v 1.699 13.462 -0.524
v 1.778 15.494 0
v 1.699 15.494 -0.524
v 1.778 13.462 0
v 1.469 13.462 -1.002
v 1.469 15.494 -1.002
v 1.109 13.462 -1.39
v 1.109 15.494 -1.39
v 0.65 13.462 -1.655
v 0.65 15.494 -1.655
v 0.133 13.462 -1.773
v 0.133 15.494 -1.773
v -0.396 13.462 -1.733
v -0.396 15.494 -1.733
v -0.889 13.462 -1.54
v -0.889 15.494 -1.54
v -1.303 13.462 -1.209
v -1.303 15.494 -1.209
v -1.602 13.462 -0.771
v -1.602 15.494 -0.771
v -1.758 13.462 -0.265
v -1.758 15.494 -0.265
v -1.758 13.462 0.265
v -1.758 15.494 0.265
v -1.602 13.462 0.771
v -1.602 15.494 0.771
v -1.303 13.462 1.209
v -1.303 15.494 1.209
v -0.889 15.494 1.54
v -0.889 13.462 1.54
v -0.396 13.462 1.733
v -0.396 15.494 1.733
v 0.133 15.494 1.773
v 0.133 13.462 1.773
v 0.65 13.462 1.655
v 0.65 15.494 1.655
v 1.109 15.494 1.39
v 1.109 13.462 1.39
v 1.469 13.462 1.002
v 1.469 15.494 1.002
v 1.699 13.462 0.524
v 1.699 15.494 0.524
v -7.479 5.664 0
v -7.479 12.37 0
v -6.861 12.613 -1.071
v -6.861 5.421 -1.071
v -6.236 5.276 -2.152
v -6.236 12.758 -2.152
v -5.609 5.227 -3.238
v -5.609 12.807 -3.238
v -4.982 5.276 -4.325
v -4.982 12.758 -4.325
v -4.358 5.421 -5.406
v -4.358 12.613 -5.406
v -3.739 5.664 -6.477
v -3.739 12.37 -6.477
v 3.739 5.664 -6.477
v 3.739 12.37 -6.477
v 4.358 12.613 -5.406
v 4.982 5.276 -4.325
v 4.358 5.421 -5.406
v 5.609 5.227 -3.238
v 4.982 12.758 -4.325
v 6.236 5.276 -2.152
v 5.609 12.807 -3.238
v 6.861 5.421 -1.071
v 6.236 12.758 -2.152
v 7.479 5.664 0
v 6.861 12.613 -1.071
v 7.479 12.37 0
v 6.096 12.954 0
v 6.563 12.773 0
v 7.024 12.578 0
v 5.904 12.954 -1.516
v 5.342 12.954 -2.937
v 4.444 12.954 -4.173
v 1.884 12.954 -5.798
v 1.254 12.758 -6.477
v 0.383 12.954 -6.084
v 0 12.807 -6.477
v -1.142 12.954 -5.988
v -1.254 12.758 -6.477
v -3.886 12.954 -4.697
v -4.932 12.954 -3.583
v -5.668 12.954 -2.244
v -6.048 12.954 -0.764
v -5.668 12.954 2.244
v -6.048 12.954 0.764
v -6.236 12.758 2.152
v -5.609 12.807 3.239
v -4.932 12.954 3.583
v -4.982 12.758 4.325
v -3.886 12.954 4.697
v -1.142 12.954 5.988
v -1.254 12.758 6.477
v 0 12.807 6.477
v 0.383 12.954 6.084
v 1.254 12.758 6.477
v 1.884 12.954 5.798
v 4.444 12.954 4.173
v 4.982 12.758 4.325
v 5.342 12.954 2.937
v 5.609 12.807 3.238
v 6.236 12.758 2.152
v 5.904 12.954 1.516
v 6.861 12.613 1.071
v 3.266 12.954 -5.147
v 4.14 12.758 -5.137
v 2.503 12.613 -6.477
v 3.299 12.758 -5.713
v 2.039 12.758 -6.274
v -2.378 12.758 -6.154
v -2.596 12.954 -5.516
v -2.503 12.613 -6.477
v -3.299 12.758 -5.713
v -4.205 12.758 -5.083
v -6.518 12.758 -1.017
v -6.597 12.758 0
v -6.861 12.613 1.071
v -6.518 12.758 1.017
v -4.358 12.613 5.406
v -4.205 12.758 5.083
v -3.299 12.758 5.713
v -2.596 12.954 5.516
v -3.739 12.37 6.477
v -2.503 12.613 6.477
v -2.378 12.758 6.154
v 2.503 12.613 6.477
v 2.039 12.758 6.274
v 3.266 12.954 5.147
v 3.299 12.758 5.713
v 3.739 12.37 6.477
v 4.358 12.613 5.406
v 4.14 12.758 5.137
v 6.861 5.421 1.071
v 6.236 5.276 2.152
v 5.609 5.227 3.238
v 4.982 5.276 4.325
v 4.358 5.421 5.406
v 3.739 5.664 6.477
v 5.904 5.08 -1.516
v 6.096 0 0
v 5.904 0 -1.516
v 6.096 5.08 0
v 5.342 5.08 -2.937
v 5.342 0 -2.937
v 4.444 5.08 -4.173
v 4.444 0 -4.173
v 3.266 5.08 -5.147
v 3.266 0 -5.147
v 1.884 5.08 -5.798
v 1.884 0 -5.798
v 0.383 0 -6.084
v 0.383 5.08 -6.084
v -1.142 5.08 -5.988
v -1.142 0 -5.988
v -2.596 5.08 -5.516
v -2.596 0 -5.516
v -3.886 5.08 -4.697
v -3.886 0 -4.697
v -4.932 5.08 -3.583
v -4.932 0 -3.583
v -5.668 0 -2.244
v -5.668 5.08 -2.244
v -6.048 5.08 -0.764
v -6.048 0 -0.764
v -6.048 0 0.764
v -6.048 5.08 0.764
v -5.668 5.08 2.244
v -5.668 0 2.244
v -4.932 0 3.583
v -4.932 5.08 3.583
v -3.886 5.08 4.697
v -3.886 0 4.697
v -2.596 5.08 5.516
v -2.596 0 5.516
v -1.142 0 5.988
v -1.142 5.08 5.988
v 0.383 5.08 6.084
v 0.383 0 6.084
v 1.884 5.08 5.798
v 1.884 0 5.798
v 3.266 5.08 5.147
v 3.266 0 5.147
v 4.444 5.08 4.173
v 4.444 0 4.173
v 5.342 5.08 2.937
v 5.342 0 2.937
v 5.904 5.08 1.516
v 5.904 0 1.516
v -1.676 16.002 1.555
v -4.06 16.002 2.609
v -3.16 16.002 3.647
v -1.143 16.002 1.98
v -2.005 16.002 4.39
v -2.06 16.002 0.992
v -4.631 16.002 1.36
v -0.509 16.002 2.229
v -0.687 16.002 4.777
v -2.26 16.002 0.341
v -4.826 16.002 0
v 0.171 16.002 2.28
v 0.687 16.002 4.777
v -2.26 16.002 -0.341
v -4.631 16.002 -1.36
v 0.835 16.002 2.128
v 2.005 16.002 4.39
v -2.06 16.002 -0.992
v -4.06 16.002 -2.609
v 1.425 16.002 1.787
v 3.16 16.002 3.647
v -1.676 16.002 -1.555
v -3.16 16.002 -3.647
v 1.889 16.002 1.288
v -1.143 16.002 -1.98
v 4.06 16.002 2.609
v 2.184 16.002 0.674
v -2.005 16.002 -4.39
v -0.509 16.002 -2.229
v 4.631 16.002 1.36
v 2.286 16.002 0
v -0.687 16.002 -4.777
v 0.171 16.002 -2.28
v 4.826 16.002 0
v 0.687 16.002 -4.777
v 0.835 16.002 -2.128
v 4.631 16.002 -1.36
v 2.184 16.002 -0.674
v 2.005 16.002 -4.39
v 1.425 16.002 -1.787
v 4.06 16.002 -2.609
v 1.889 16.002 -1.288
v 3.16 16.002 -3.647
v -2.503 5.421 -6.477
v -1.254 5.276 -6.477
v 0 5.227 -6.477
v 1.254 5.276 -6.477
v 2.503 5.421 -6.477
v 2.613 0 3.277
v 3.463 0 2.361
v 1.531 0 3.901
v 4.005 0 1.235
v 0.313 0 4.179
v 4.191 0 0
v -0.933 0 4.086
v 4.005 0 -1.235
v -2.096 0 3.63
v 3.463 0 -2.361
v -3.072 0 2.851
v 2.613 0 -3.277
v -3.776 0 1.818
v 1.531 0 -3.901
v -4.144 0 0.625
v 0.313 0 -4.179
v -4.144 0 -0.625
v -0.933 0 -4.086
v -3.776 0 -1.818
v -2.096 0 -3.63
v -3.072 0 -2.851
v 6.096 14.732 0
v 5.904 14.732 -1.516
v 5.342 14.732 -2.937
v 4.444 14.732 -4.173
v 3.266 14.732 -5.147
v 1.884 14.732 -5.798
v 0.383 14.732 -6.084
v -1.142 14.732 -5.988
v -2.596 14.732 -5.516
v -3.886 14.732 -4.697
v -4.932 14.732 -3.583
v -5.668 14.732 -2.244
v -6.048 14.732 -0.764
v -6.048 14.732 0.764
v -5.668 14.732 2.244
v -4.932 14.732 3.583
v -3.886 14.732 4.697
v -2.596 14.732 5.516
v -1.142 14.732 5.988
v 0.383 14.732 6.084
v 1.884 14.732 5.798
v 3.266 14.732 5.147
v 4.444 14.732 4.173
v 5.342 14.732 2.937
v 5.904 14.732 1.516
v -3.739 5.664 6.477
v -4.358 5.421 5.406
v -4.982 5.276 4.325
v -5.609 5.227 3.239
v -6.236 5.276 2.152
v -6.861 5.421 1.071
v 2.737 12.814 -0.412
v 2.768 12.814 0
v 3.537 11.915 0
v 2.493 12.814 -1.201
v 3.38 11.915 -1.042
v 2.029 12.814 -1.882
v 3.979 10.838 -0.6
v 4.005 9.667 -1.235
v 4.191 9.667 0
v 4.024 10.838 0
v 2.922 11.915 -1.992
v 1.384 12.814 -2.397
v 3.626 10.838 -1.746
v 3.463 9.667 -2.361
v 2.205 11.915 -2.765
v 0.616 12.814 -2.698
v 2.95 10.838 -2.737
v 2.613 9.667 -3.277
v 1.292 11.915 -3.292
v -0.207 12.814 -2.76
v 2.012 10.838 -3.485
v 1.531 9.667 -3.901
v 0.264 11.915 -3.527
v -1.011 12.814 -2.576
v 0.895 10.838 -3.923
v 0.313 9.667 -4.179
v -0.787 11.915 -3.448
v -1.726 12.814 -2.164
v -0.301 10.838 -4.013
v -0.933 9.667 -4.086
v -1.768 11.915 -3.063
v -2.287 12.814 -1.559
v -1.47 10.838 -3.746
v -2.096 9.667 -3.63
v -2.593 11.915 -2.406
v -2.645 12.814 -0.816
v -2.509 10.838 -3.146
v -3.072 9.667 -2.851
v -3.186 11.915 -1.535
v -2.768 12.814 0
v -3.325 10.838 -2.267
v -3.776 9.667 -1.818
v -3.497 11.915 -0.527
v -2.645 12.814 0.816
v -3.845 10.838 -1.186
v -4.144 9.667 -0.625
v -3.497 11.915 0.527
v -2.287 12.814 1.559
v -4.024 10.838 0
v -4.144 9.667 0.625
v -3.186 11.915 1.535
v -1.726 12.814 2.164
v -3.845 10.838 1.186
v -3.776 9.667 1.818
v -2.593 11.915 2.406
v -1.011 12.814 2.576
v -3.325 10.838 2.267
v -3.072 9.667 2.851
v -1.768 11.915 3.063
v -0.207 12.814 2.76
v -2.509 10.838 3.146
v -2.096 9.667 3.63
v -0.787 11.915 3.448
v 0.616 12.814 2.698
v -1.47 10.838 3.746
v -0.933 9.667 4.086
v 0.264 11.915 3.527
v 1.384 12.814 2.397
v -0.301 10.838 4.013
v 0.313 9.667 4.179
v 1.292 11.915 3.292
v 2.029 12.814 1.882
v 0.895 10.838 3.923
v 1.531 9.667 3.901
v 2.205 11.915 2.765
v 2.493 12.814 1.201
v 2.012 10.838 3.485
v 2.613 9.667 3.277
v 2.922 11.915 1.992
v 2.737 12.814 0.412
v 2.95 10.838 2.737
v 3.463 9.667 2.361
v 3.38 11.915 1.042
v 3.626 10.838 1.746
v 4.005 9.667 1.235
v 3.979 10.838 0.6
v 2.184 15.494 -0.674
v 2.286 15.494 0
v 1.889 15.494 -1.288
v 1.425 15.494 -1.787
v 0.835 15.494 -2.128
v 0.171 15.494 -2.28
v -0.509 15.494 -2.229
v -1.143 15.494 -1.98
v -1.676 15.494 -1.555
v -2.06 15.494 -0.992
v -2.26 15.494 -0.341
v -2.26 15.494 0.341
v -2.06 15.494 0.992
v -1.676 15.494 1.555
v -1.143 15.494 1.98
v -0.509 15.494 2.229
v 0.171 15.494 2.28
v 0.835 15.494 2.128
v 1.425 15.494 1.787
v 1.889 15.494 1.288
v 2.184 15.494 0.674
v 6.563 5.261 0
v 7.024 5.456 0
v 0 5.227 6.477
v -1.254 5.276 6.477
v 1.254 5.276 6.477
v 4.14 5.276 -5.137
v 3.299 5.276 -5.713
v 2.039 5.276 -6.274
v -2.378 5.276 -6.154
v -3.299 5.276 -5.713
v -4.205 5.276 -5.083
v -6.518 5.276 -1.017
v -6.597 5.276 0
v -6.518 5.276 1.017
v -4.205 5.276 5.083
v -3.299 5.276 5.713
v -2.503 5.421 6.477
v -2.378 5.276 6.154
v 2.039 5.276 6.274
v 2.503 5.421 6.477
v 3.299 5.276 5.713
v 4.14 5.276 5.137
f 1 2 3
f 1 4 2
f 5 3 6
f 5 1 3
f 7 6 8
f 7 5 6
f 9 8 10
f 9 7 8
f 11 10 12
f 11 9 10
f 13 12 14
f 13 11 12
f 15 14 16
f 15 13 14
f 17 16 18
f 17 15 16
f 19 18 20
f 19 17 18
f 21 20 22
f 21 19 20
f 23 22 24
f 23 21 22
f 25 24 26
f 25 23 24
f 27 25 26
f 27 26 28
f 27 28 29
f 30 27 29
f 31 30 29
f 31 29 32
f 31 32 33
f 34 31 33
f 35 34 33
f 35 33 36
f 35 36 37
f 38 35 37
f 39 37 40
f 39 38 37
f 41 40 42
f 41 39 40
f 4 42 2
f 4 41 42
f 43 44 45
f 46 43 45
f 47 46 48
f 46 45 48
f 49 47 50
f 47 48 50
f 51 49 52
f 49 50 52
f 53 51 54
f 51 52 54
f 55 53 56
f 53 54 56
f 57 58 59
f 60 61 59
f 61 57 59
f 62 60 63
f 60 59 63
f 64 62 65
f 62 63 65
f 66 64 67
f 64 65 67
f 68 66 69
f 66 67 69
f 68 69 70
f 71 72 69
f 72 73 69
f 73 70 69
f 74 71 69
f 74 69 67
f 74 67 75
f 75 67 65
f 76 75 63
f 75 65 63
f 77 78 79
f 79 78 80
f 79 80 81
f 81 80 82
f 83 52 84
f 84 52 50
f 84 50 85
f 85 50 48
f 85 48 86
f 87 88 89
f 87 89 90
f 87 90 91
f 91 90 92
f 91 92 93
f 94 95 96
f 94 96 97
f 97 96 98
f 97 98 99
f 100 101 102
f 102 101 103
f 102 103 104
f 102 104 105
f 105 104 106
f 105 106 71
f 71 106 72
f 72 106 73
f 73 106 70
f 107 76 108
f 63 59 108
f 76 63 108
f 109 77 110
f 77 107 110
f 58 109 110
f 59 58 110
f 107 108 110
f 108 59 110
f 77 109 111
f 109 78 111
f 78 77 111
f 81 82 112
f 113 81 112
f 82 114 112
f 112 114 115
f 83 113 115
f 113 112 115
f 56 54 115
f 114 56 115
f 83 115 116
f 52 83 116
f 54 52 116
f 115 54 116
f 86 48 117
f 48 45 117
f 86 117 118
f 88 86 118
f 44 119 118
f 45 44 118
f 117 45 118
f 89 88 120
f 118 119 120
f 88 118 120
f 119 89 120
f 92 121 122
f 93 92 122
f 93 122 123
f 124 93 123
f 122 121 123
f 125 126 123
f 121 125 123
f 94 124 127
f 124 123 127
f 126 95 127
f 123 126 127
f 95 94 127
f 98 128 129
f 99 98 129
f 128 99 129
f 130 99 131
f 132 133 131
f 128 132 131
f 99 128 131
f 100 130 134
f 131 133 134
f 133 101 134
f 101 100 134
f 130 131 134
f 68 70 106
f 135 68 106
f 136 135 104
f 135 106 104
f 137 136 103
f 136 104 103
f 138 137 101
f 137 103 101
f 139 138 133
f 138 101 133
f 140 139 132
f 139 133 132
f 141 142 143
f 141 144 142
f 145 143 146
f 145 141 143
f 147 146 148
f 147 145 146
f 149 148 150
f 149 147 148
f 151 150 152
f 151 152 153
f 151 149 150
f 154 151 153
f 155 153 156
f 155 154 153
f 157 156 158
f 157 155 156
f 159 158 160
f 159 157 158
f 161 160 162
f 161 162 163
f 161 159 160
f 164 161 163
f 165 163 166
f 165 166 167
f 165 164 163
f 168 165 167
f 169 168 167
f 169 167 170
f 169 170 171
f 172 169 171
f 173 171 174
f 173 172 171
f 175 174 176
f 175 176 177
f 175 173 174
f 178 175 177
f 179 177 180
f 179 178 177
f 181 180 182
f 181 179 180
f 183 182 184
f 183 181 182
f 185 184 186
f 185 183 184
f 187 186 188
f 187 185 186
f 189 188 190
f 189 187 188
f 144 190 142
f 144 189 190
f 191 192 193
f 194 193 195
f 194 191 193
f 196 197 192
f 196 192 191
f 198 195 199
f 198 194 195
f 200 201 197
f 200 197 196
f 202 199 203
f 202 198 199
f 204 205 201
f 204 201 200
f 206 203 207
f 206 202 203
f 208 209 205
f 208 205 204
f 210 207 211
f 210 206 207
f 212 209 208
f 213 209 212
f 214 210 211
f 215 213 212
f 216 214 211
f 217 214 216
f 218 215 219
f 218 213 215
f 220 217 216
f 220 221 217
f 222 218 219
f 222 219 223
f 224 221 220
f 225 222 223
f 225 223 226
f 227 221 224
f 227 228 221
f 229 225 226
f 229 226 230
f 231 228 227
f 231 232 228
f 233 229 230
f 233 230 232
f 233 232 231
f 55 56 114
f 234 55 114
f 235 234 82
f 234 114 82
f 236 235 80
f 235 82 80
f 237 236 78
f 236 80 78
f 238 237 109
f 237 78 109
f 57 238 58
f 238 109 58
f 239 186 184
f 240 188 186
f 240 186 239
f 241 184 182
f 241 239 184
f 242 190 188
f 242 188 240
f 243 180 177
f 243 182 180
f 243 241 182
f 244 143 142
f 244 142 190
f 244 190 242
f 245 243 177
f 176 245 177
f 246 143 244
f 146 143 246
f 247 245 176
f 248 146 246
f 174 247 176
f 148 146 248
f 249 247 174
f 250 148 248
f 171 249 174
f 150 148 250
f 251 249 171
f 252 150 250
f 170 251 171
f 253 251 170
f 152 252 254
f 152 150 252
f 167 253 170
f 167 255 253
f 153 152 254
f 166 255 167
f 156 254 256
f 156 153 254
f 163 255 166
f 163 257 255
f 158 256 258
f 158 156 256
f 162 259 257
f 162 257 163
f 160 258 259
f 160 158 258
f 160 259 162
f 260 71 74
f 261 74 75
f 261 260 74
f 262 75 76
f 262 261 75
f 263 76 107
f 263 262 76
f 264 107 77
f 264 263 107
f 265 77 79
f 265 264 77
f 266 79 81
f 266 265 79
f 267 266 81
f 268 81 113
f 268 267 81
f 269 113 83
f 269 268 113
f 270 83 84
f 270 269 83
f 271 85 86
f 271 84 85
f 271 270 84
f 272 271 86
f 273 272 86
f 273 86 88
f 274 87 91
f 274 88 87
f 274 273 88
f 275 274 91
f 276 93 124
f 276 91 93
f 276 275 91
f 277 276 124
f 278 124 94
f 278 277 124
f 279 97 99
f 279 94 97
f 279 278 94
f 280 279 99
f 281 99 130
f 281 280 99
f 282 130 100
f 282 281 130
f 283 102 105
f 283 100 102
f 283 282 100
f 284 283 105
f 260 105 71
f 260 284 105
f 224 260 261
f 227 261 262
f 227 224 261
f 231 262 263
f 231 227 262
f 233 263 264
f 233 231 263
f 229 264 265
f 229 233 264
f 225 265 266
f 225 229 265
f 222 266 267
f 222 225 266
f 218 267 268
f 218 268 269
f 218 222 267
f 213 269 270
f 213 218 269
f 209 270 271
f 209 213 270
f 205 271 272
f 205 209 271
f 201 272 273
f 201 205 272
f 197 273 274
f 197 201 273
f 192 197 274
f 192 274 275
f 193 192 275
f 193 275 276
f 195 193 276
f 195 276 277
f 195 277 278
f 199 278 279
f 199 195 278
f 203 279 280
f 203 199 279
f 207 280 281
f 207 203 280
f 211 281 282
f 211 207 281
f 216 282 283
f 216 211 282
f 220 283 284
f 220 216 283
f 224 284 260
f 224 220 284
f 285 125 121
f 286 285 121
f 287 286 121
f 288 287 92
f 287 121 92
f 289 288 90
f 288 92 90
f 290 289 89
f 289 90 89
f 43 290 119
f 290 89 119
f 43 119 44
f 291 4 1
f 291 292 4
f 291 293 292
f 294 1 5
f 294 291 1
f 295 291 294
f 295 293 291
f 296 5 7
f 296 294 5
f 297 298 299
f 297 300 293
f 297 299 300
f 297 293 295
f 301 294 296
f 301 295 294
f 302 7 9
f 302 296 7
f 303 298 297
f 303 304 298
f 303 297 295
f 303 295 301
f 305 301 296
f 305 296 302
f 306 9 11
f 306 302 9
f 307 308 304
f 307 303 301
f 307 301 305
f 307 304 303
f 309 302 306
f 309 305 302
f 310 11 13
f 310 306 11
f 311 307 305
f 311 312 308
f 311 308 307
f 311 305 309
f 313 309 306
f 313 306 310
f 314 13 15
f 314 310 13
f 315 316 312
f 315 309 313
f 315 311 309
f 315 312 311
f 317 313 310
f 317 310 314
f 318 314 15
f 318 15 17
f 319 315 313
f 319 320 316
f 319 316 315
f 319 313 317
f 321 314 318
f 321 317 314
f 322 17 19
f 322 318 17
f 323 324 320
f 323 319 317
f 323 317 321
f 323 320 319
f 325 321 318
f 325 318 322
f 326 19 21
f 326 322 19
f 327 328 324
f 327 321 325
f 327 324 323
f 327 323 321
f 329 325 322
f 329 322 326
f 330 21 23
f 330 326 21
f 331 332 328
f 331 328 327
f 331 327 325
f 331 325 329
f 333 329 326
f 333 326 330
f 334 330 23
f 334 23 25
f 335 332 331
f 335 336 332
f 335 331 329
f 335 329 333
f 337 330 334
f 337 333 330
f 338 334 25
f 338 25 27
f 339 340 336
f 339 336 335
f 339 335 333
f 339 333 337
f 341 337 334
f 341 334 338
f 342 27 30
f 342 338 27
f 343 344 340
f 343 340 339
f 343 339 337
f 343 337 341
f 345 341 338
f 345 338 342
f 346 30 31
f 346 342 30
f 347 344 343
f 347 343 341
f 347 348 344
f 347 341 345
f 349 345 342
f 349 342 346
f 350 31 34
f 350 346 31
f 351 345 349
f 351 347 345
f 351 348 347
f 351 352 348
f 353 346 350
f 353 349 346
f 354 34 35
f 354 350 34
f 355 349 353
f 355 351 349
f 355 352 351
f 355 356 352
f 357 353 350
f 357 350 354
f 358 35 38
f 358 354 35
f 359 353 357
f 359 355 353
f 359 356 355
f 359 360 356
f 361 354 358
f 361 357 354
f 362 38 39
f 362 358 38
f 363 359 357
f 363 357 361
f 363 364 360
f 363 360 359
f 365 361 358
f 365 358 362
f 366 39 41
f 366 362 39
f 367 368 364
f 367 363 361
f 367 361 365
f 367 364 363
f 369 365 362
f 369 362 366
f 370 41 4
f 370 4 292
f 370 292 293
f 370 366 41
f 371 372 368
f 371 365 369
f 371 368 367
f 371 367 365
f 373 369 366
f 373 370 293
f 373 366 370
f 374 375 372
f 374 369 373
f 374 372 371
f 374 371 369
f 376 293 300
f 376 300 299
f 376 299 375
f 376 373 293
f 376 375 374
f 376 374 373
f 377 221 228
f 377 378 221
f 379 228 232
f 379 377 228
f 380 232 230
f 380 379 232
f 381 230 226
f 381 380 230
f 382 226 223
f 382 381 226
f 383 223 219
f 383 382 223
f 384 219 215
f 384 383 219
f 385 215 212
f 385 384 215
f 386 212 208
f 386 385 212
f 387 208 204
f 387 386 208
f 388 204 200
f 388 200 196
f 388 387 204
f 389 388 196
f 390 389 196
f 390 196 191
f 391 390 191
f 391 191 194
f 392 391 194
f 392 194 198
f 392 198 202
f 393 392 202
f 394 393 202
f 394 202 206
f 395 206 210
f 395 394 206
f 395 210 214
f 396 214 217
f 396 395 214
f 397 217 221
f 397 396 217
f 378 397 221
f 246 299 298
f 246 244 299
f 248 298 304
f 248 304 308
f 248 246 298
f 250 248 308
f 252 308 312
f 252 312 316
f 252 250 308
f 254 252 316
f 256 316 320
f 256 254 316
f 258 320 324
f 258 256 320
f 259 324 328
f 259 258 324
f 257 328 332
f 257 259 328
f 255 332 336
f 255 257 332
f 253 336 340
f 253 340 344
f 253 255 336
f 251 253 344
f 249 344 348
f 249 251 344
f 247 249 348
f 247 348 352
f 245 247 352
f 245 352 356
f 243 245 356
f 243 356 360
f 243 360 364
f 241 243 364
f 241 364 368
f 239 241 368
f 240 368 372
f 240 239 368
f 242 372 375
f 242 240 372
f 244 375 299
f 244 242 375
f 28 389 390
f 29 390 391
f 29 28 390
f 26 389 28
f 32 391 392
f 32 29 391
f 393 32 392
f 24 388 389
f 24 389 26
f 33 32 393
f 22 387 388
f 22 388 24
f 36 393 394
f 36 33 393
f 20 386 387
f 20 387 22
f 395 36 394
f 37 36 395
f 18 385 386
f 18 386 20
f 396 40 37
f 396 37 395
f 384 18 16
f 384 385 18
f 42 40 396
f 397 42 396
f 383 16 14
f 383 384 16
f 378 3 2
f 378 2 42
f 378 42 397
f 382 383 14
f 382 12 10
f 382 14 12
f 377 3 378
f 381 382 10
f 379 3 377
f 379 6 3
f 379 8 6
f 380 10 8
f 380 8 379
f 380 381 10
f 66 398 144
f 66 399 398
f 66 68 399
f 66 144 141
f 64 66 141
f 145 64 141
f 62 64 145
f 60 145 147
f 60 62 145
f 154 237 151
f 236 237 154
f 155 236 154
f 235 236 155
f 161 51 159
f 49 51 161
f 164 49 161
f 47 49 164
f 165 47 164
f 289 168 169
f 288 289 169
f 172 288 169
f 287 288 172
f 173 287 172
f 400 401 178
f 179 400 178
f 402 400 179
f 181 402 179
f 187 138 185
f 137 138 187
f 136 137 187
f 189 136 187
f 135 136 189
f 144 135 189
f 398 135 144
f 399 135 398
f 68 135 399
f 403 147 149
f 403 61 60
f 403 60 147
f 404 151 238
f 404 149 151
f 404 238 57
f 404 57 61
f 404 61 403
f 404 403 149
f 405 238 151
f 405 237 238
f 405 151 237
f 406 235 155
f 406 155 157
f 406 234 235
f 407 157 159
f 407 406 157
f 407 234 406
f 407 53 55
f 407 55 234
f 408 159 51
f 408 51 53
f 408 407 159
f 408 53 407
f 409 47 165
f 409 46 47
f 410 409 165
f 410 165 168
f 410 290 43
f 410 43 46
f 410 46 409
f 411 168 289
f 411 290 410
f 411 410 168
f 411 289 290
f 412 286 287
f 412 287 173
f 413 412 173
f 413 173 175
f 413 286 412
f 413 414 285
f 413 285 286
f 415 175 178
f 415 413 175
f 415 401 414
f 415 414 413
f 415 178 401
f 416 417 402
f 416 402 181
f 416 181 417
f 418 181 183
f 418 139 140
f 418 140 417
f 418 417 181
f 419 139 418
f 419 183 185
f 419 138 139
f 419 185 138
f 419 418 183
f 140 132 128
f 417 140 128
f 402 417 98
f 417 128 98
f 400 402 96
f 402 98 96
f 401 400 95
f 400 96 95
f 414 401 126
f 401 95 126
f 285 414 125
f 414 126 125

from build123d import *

# Parameters (mm, degrees)
SKETCH3_R           = 6.096
BOSS_EXTRUDE1_DEPTH = 7.874


with BuildPart() as part:
    # Sketch1 → Base-Revolve (revolve)
    with BuildSketch(Plane.XY):
        with BuildLine():
            Line((6.096, 0), (6.096, 14.732))
            Line((6.096, 14.732), (4.826, 16.002))
            Line((4.826, 16.002), (2.286, 16.002))
            Line((2.286, 16.002), (2.286, 15.494))
            Line((2.286, 15.494), (1.778, 15.494))
            Line((1.778, 15.494), (1.778, 13.462))
            ThreePointArc((1.778, 13.462), (3.53667068, 11.915498853), (4.191, 9.666845589))
            Line((4.191, 9.666845589), (4.191, 0))
            Line((4.191, 0), (6.096, 0))
        make_face()
    revolve(axis=Axis((0, 0, 0), (0, 1, 0)))

    # Sketch3 → Boss-Extrude1 (add)
    with BuildSketch(Plane(origin=(0, 12.954, 0), x_dir=(-1, 0, 0), z_dir=(0, 1, 0))):
        Polygon((3.739497694, -6.477), (-3.739497694, -6.477), (-7.478995387, 0), (-3.739497694, 6.477), (3.739497694, 6.477), (7.478995387, 0), align=None)
        Circle(SKETCH3_R, mode=Mode.SUBTRACT)
    extrude(amount=-BOSS_EXTRUDE1_DEPTH)

    # Sketch4 → Cut-Revolve1 (revolve, cut)
    with BuildSketch(Plane.XY):
        with BuildLine():
            Line((7.478995387, 12.954), (6.096, 12.954))
            ThreePointArc((6.096, 12.954), (6.793780049, 12.676772421), (7.478995387, 12.3698))
            Line((7.478995387, 12.3698), (7.478995387, 12.954))
        make_face()
    cut_revolve1 = revolve(axis=Axis((0, 0, 0), (0, 1, 0)), mode=Mode.SUBTRACT)

    # Mirror1: Cut-Revolve1 across plane
    add(cut_revolve1.mirror(Plane.ZX.offset(9.017)), mode=Mode.SUBTRACT)


solid = part.part
